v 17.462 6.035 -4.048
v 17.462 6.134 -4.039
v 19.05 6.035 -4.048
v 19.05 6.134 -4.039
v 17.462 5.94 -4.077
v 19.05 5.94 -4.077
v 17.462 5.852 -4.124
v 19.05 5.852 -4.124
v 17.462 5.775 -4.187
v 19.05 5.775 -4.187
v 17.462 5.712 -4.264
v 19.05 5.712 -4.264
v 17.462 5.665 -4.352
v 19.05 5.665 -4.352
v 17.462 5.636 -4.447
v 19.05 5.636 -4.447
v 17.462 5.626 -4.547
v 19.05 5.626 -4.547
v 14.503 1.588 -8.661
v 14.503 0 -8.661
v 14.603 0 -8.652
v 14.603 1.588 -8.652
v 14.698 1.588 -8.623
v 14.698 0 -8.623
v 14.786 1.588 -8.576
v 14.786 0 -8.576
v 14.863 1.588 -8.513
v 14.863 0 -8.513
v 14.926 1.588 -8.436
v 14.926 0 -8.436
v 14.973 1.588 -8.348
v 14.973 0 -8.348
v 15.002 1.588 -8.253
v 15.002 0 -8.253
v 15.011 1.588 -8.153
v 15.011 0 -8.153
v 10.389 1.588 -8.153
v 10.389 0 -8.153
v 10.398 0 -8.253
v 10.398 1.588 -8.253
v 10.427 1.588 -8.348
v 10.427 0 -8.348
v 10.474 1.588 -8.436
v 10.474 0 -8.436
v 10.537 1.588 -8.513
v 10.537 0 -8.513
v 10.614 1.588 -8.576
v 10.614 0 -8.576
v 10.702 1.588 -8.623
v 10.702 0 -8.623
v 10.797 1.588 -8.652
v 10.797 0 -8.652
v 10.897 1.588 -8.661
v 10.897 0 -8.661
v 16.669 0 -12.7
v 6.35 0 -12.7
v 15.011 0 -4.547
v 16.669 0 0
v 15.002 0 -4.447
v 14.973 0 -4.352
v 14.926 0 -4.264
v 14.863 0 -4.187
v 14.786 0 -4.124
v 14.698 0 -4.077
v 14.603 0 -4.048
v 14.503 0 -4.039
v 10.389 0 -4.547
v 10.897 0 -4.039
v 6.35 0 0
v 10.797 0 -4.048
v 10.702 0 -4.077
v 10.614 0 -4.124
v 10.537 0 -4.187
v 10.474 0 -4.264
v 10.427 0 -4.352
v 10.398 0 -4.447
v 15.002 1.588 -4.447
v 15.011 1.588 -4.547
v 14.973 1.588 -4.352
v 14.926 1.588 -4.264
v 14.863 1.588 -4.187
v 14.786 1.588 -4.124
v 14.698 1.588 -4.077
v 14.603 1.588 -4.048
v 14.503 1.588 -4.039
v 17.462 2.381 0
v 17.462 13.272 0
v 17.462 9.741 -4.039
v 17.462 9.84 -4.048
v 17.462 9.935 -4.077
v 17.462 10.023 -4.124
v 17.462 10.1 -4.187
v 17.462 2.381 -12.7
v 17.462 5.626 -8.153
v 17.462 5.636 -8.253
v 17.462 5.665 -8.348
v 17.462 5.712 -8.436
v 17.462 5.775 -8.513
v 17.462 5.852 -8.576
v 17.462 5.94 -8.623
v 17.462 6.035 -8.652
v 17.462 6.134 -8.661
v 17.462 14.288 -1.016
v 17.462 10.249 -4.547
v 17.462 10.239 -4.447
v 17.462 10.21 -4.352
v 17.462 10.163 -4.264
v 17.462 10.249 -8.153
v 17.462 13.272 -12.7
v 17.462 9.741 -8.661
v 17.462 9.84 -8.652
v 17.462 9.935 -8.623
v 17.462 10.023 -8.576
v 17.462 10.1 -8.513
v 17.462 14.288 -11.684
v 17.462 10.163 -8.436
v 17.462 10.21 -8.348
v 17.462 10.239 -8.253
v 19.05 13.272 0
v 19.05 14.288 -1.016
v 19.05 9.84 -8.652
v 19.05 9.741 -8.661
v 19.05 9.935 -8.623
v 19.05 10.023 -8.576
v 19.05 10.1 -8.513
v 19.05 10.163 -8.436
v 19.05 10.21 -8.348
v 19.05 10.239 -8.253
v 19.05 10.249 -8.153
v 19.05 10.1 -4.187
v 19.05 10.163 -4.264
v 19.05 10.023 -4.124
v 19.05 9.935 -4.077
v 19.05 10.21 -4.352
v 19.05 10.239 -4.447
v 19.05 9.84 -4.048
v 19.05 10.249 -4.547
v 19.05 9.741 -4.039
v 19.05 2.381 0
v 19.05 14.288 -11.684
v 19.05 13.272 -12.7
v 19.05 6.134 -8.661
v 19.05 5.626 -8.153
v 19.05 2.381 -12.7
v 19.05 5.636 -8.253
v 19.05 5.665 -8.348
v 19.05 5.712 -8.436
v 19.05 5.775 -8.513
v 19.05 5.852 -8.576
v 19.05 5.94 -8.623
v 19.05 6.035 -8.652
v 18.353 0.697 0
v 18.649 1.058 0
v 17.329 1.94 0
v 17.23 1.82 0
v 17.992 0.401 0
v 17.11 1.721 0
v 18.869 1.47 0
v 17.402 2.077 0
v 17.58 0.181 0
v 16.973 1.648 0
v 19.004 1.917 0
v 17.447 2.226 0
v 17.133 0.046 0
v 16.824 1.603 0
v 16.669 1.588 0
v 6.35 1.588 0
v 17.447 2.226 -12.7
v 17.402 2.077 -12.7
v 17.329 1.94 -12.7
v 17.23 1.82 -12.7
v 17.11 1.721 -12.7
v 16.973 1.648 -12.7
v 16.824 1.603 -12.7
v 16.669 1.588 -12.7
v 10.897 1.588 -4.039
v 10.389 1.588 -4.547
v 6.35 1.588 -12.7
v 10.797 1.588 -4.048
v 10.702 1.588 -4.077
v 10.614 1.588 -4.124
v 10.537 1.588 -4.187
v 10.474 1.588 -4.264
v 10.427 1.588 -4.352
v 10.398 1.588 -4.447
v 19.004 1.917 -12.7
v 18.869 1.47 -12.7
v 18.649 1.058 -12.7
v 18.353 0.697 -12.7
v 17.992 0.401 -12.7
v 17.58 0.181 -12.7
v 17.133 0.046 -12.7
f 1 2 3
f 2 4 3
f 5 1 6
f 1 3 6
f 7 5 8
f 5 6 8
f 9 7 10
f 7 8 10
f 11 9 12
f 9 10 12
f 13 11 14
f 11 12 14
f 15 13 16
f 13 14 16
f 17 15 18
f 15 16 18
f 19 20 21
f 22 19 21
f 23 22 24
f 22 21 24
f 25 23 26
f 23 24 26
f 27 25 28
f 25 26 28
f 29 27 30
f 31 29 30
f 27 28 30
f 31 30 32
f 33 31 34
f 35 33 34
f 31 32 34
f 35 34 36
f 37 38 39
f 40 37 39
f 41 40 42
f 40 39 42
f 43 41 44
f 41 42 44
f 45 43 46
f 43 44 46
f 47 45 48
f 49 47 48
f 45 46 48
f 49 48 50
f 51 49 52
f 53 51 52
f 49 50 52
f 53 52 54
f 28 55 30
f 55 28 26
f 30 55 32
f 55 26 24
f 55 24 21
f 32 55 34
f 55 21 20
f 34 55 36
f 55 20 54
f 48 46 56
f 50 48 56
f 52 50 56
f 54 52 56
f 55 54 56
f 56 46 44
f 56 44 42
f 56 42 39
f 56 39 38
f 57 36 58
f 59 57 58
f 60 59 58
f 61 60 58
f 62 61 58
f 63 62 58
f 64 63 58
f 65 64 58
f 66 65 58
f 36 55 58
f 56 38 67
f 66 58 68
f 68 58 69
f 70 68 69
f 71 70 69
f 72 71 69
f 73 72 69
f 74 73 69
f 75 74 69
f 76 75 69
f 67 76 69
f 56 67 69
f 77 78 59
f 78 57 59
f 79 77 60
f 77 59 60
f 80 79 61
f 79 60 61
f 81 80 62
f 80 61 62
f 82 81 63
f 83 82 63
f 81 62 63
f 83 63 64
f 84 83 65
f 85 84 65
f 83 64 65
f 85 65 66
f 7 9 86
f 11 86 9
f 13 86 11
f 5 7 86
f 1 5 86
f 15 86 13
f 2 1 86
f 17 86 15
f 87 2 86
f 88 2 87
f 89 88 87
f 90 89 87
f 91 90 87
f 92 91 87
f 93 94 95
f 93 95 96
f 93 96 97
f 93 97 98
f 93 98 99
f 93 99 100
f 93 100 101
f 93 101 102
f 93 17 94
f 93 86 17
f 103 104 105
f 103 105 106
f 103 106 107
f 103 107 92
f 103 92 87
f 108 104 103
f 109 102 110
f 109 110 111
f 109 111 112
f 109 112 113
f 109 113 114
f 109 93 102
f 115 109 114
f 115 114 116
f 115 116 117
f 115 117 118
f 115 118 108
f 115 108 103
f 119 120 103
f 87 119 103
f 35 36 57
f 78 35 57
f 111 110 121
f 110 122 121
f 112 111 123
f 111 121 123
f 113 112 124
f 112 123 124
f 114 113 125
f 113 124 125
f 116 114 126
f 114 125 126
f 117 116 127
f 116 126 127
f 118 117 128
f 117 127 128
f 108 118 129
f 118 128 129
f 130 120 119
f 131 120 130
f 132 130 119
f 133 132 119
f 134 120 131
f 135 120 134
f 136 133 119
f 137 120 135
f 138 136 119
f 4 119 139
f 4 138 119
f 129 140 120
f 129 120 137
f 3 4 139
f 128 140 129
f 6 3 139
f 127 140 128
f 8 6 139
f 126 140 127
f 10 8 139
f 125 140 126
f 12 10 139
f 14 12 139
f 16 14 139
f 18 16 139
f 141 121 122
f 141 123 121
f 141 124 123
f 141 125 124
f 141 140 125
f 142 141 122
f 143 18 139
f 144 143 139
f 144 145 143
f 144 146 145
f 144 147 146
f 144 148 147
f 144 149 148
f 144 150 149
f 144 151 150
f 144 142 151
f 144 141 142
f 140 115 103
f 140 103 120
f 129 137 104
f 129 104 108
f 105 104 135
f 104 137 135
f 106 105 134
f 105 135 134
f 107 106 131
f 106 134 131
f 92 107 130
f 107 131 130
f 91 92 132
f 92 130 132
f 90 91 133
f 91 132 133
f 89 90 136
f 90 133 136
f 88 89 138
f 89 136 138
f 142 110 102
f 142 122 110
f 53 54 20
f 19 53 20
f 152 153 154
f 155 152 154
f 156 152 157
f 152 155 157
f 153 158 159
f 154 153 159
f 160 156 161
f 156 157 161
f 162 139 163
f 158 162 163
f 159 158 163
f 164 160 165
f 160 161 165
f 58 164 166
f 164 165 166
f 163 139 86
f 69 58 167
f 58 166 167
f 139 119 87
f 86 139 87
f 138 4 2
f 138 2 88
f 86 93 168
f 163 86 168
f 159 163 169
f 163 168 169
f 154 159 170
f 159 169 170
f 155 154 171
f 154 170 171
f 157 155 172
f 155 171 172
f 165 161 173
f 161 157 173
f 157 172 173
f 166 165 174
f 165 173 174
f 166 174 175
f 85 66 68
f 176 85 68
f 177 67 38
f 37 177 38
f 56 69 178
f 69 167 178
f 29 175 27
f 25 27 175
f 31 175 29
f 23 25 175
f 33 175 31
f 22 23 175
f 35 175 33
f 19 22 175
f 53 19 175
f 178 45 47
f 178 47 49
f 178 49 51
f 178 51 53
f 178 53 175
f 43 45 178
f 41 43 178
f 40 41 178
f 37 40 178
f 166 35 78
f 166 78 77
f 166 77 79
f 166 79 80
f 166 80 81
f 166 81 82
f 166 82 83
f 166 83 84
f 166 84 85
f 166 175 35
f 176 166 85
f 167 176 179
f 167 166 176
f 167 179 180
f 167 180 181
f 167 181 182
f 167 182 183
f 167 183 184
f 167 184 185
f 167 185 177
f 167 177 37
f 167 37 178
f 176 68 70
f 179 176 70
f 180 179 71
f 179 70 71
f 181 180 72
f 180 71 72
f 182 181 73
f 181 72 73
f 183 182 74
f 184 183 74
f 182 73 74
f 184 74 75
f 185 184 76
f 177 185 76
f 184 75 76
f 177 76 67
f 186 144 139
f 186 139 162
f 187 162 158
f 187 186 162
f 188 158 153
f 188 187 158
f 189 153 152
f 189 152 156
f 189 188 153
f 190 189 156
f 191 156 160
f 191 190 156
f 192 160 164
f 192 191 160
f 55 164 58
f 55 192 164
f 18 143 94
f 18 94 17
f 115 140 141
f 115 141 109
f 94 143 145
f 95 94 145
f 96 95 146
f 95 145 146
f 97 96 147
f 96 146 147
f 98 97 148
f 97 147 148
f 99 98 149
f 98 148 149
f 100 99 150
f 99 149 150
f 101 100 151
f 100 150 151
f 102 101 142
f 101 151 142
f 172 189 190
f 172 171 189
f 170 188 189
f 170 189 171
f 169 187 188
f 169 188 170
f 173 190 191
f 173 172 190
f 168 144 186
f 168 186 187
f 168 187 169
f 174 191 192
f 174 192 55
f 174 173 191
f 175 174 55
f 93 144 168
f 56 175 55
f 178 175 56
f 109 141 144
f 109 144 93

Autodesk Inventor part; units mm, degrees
ref_plane "YZ Plane" through (0, 0, 0) normal (1, 0, 0) x (0, 1, 0)
ref_plane "XZ Plane" through (0, 0, 0) normal (0, 1, 0) x (-1, 0, 0)
sketch "Sketch1" plane through (0, 0, 0) normal (0, 1, 0) x (-1, 0, 0)
  line L0 (-19.05, 0) -> (19.05, 0)
  line L1 (19.05, 0) -> (19.05, -12.7)
  line L2 (19.05, -12.7) -> (-19.05, -12.7)
  line L3 (-19.05, -12.7) -> (-19.05, 0)
  line L4 (19.05, 0) -> (-19.05, -12.7) construction
  point P0 (0, 0)
  point P1 (0, 0)
  dimension "d0" = 38.1
  dimension "d1" = 12.7
extrude "Plate1" add sketch "Sketch1" along normal blind 1.5875
sketch "Sketch2" plane through (17.4625, 0, -12.7) normal (1, 0, 0) x (0, 1, 0)
  line L0 (0, 12.7) -> (0, 0)
  line L1 (0, 0) -> (14.2875, 0)
  line L2 (14.2875, 0) -> (14.2875, 12.7)
  line L3 (14.2875, 12.7) -> (0, 12.7)
edge flange "Flanges" height 12.7 angle 90 thickness 1.5875 bend radius 0.7937 thickness toward (1, 0, 0) relief tear relief width 1.5875 relief depth 0.7937 corner gap 1.5875 corner form 0 edges at (19.05, 1.5875, -6.35) (-19.05, 1.5875, -6.35) wall of the first edge with corners at (17.4625, 0, 0) (17.4625, 0, -12.7) (17.4625, 14.2875, -12.7) (17.4625, 14.2875, 0)
bend "Bend1"
corner "Corner1"
sketch "Sketch3" plane through (19.05, 2.3813, -12.7) normal (1, 0, 0) x (0, 0, -1)
  line L0 (-8.1534, 7.8676) -> (-4.5466, 7.8676)
  line L1 (-4.0386, 7.3596) -> (-4.0386, 3.7529)
  line L2 (-4.5466, 3.2449) -> (-8.1534, 3.2449)
  line L3 (-8.6614, 3.7529) -> (-8.6614, 7.3596)
  arc A0 (-8.1534, 7.8676) -> (-8.6614, 7.3596) centre (-8.1534, 7.3596) ccw
  arc A1 (-4.0386, 7.3596) -> (-4.5466, 7.8676) centre (-4.5466, 7.3596) ccw
  arc A2 (-4.5466, 3.2449) -> (-4.0386, 3.7529) centre (-4.5466, 3.7529) ccw
  arc A3 (-8.6614, 3.7529) -> (-8.1534, 3.2449) centre (-8.1534, 3.7529) ccw
  line L4 (-12.7, 0) -> (-12.7, 11.9063) construction
  line L5 (-12.7, 11.9063) -> (0, 11.9063) construction
  line L6 (-8.1534, 7.3596) -> (-4.5466, 3.7529) construction
  point P0 (-12.7, -2.3812)
  point P1 (-4.0386, 3.2449)
  point P2 (-8.6614, 3.2449)
  point P3 (-6.35, 5.5563)
  dimension "d16" = 4.6228
  dimension "d17" = 0.508
  dimension "d20" = 6.35
  dimension "d21" = 6.35
extrude "Flange Stamp" cut sketch "Sketch3" against normal blind 1.5875
sketch "Sketch7" plane through (19.05, 2.3813, 0) normal (1, 0, 0) x (0, 0, -1)
  arc A0 (4.5466, 7.8676) -> (4.0386, 7.3596) centre (4.5466, 7.3596) ccw construction
  arc A1 (8.1534, 3.2449) -> (8.6614, 3.7529) centre (8.1534, 3.7529) ccw construction
  circle A2 centre (6.35, 5.5563) radius 2.1844
  line L0 (4.5466, 7.3596) -> (8.1534, 3.7529) construction
  point P0 (0, -2.3812)
  dimension "d46" = 4.3688
surface extrude "Flange Circle" sketch "Sketch7" against normal up to surface (1.5875 mm away) shown yes curves A2
ref_plane "Flange Pattern Plane" through (19.05, 7.9375, -4.5466) normal (0, 1, 0) x (1, 0, 0)
feature "Flange Pattern" [suppressed]
sketch "Sketch8" plane through (0, 0, 0) normal (0, -1, 0) x (1, 0, 0)
  line L0 (16.6687, 0) -> (-16.6687, 0) construction
  line L1 (14.5034, -4.0386) -> (10.8966, -4.0386)
  line L2 (10.3886, -4.5466) -> (10.3886, -8.1534)
  line L3 (10.8966, -8.6614) -> (14.5034, -8.6614)
  line L4 (15.0114, -8.1534) -> (15.0114, -4.5466)
  arc A0 (15.0114, -4.5466) -> (14.5034, -4.0386) centre (14.5034, -4.5466) ccw
  arc A1 (14.5034, -8.6614) -> (15.0114, -8.1534) centre (14.5034, -8.1534) ccw
  arc A2 (10.3886, -8.1534) -> (10.8966, -8.6614) centre (10.8966, -8.1534) ccw
  arc A3 (10.8966, -4.0386) -> (10.3886, -4.5466) centre (10.8966, -4.5466) ccw
  line L5 (14.5034, -4.5466) -> (10.8966, -8.1534) construction
  line L6 (19.05, 0) -> (19.05, -12.7) construction
  point P0 (0, 0)
  point P1 (10.3886, -8.6614)
  point P2 (15.0114, -8.6614)
  point P3 (12.7, -6.35)
  dimension "d49" = 4.6228
  dimension "d50" = 0.508
  dimension "d51" = 6.35
  dimension "d52" = 6.35
extrude "Body Stamp" cut sketch "Sketch8" against normal blind 1.5875
sketch "Sketch9" plane through (0, 0, 0) normal (0, -1, 0) x (1, 0, 0)
  arc A0 (15.0114, -4.5466) -> (14.5034, -4.0386) centre (14.5034, -4.5466) ccw construction
  arc A1 (10.3886, -8.1534) -> (10.8966, -8.6614) centre (10.8966, -8.1534) ccw construction
  line L0 (14.5034, -4.5466) -> (10.8966, -8.1534) construction
  circle A2 centre (12.7, -6.35) radius 2.1844
  point P0 (0, 0)
  dimension "d55" = 4.3688
surface extrude "Body Circle" sketch "Sketch9" against normal up to surface (1.5875 mm away) shown yes curves A2
feature "Body Pattern" [suppressed]
sketch "Arc Length" plane through (17.4625, 2.3813, 0) normal (0, 0, 1) x (1, 0, 0)
  line L0 (0, 0) -> (1.5875, 0) construction
  arc A0 (-0.7938, -0.7938) -> (0, 0) centre (-0.7937, 0) ccw construction
  line L1 (-0.7938, -2.3813) -> (-0.7938, -0.7938) construction
  arc A1 (-0.7938, -2.3813) -> (1.5875, 0) centre (-0.7937, 0) ccw construction
  point P0 (-17.4625, -2.3812)
  dimension "d85" = 3.7405
  dimension "d92" = 1.2468
sketch "Sketch13" plane through (19.05, 14.2875, 0) normal (1, 0, 0) x (0, 0, -1)
  line L0 (0, 0) -> (12.7, 0) construction
  line L1 (62.4078, 0) -> (63.4238, -1.016)
  line L2 (63.4238, -1.016) -> (64.4398, 0)
  line L3 (62.4078, 0) -> (64.4398, 0)
  line L4 (12.7, -11.9063) -> (0, -11.9062) construction
  line L5 (63.4238, -10.8903) -> (61.161, -13.1531)
  line L6 (61.161, -13.1531) -> (63.4238, -15.4159)
  line L7 (63.4238, -15.4159) -> (65.6866, -13.1531)
  line L8 (65.6866, -13.1531) -> (63.4238, -10.8903)
  line L9 (63.4238, -10.8903) -> (63.4238, -15.4159) construction
  line L10 (63.4238, -1.016) -> (63.4238, -10.8903) construction
  line L11 (0, -11.9062) -> (12.7, -11.9063) construction
  point P0 (0, -14.2875)
  dimension "d86" = 4.5256
  dimension "d88" = 1.016
  dimension "d91" = 1.016
  dimension "d102" = 63.4238
feature "Notch" [suppressed]
mirror "Notch Mirror" [suppressed]
pattern_linear "Notch Pattern" [suppressed]
chamfer "End Chamfer" distance 1.016 angle 45 4 edges at (-18.2563, 14.2875, -12.7) (18.2563, 14.2875, -12.7) (-18.2562, 14.2875, 0) (18.2562, 14.2875, 0)
sketch "Sketch14" plane through (-19.05, 2.3813, 431.8) normal (1, 0, 0) x (0, 0, -1)
  line L0 (431.8, 11.9063) -> (444.5, 11.9063) construction
  line L1 (431.8, 0) -> (431.8, 11.9063) construction
  line L2 (431.8, -2.3813) -> (444.5, -2.3813) construction
  line L3 (431.8, 11.9063) -> (444.5, 11.9063)
  line L4 (444.5, 11.9063) -> (444.5, -2.3813)
  line L5 (444.5, -2.3813) -> (431.8, -2.3813)
  line L6 (431.8, -2.3813) -> (431.8, 11.9063)
  point P0 (431.8, -2.3812)
  point P1 (382.0521, -1.9844)
extrude "Half Cut" cut sketch "Sketch14" along normal blind 25.4
sketch "Flange Pattern Sketch" plane through (19.05, 7.9375, -4.5466) normal (0, 1, 0) x (1, 0, 0)
  line L0 (0, 3.6068) -> (0, 0) construction
  line L1 (-45.8186, -4.5466) -> (8.2118, -4.5466) construction
  line L2 (0, 0) -> (-1.5875, 0) construction
  point P0 (-19.05, -4.5466)
  point P1 (0, 1.8034)
  point P2 (0, 14.5034)
  point P3 (0, 27.2034)
  point P4 (0, 39.9034)
  point P5 (0, 52.6034)
  point P6 (0, 65.3034)
  point P7 (0, 78.0034)
  point P8 (0, 90.7034)
  point P9 (0, 103.4034)
  point P10 (0, 116.1034)
  point P11 (0, 128.8034)
  point P12 (0, 141.5034)
  point P13 (0, 154.2034)
  point P14 (0, 166.9034)
  point P15 (0, 179.6034)
  point P16 (0, 192.3034)
  point P17 (0, 205.0034)
  point P18 (0, 217.7034)
  point P19 (0, 230.4034)
  point P20 (0, 243.1034)
  point P21 (0, 255.8034)
  point P22 (0, 268.5034)
  point P23 (0, 281.2034)
  point P24 (0, 293.9034)
  point P25 (0, 306.6034)
  point P26 (0, 319.3034)
  point P27 (0, 332.0034)
  point P28 (0, 344.7034)
  point P29 (0, 357.4034)
  point P30 (0, 370.1034)
  point P31 (0, 382.8034)
  point P32 (0, 395.5034)
  point P33 (0, 408.2034)
  point P34 (0, 420.9034)
  point P35 (0, 433.6034)
  dimension "d131" = 12.7
  dimension "d134" = 12.7
sketch "Body Pattern Sketch" plane through (0, 0, 0) normal (0, -1, 0) x (1, 0, 0)
  line L0 (16.6687, 0) -> (-16.6687, 0) construction
  line L1 (19.05, 0) -> (19.05, -12.7) construction
  circle A0 centre (12.7, -6.35) radius 2.1844 construction
  point P0 (0, 0)
  point P1 (12.7, -19.05)
  point P2 (12.7, -31.75)
  point P3 (12.7, -44.45)
  point P4 (12.7, -57.15)
  point P5 (12.7, -69.85)
  point P6 (12.7, -82.55)
  point P7 (12.7, -95.25)
  point P8 (12.7, -107.95)
  point P9 (12.7, -120.65)
  point P10 (12.7, -133.35)
  point P11 (12.7, -146.05)
  point P12 (12.7, -158.75)
  point P13 (12.7, -171.45)
  point P14 (12.7, -184.15)
  point P15 (12.7, -196.85)
  point P16 (12.7, -209.55)
  point P17 (12.7, -222.25)
  point P18 (12.7, -234.95)
  point P19 (12.7, -247.65)
  point P20 (12.7, -260.35)
  point P21 (12.7, -273.05)
  point P22 (12.7, -285.75)
  point P23 (12.7, -298.45)
  point P24 (12.7, -311.15)
  point P25 (12.7, -323.85)
  point P26 (12.7, -336.55)
  point P27 (12.7, -349.25)
  point P28 (12.7, -361.95)
  point P29 (12.7, -374.65)
  point P30 (12.7, -387.35)
  point P31 (12.7, -400.05)
  point P32 (12.7, -412.75)
  point P33 (12.7, -425.45)
  point P34 (12.7, -438.15)
  dimension "d62" = 12.7
  dimension "d65" = 12.7
  dimension "d139" = 12.7
equation "\"d1\" = 12.7 * Length"
equation "\"d18\" = Thickness"
equation "\"d53\" = Thickness"
equation "\"d89\" = Thickness"
equation "\"d2\" = Thickness"
equation "\"d3\" = BendReliefWidth"
equation "\"d4\" = BendReliefDepth"
equation "\"d5\" = MinimumRemnant"
equation "\"d6\" = TransitionRadius"
equation "\"d10\" = CornerReliefSize"
equation "\"d11\" = GapSize"
equation "\"d12\" = JacobiRadiusSize"
equation "\"BendRadius\" = Thickness"
equation "\"BendReliefWidth\" = Thickness"
equation "\"BendReliefDepth\" = 0.5 * Thickness"
equation "\"CornerReliefSize\" = 4 * Thickness"
equation "\"MinimumRemnant\" = 2 * Thickness"
equation "\"TransitionRadius\" = BendRadius"
equation "\"JacobiRadiusSize\" = BendRadius"
equation "\"GapSize\" = Thickness"
equation "\"Length\" = 1"
equation "\"Thickness\" = 1.5875"
properties part number "Alu C 1x3x1x35"
